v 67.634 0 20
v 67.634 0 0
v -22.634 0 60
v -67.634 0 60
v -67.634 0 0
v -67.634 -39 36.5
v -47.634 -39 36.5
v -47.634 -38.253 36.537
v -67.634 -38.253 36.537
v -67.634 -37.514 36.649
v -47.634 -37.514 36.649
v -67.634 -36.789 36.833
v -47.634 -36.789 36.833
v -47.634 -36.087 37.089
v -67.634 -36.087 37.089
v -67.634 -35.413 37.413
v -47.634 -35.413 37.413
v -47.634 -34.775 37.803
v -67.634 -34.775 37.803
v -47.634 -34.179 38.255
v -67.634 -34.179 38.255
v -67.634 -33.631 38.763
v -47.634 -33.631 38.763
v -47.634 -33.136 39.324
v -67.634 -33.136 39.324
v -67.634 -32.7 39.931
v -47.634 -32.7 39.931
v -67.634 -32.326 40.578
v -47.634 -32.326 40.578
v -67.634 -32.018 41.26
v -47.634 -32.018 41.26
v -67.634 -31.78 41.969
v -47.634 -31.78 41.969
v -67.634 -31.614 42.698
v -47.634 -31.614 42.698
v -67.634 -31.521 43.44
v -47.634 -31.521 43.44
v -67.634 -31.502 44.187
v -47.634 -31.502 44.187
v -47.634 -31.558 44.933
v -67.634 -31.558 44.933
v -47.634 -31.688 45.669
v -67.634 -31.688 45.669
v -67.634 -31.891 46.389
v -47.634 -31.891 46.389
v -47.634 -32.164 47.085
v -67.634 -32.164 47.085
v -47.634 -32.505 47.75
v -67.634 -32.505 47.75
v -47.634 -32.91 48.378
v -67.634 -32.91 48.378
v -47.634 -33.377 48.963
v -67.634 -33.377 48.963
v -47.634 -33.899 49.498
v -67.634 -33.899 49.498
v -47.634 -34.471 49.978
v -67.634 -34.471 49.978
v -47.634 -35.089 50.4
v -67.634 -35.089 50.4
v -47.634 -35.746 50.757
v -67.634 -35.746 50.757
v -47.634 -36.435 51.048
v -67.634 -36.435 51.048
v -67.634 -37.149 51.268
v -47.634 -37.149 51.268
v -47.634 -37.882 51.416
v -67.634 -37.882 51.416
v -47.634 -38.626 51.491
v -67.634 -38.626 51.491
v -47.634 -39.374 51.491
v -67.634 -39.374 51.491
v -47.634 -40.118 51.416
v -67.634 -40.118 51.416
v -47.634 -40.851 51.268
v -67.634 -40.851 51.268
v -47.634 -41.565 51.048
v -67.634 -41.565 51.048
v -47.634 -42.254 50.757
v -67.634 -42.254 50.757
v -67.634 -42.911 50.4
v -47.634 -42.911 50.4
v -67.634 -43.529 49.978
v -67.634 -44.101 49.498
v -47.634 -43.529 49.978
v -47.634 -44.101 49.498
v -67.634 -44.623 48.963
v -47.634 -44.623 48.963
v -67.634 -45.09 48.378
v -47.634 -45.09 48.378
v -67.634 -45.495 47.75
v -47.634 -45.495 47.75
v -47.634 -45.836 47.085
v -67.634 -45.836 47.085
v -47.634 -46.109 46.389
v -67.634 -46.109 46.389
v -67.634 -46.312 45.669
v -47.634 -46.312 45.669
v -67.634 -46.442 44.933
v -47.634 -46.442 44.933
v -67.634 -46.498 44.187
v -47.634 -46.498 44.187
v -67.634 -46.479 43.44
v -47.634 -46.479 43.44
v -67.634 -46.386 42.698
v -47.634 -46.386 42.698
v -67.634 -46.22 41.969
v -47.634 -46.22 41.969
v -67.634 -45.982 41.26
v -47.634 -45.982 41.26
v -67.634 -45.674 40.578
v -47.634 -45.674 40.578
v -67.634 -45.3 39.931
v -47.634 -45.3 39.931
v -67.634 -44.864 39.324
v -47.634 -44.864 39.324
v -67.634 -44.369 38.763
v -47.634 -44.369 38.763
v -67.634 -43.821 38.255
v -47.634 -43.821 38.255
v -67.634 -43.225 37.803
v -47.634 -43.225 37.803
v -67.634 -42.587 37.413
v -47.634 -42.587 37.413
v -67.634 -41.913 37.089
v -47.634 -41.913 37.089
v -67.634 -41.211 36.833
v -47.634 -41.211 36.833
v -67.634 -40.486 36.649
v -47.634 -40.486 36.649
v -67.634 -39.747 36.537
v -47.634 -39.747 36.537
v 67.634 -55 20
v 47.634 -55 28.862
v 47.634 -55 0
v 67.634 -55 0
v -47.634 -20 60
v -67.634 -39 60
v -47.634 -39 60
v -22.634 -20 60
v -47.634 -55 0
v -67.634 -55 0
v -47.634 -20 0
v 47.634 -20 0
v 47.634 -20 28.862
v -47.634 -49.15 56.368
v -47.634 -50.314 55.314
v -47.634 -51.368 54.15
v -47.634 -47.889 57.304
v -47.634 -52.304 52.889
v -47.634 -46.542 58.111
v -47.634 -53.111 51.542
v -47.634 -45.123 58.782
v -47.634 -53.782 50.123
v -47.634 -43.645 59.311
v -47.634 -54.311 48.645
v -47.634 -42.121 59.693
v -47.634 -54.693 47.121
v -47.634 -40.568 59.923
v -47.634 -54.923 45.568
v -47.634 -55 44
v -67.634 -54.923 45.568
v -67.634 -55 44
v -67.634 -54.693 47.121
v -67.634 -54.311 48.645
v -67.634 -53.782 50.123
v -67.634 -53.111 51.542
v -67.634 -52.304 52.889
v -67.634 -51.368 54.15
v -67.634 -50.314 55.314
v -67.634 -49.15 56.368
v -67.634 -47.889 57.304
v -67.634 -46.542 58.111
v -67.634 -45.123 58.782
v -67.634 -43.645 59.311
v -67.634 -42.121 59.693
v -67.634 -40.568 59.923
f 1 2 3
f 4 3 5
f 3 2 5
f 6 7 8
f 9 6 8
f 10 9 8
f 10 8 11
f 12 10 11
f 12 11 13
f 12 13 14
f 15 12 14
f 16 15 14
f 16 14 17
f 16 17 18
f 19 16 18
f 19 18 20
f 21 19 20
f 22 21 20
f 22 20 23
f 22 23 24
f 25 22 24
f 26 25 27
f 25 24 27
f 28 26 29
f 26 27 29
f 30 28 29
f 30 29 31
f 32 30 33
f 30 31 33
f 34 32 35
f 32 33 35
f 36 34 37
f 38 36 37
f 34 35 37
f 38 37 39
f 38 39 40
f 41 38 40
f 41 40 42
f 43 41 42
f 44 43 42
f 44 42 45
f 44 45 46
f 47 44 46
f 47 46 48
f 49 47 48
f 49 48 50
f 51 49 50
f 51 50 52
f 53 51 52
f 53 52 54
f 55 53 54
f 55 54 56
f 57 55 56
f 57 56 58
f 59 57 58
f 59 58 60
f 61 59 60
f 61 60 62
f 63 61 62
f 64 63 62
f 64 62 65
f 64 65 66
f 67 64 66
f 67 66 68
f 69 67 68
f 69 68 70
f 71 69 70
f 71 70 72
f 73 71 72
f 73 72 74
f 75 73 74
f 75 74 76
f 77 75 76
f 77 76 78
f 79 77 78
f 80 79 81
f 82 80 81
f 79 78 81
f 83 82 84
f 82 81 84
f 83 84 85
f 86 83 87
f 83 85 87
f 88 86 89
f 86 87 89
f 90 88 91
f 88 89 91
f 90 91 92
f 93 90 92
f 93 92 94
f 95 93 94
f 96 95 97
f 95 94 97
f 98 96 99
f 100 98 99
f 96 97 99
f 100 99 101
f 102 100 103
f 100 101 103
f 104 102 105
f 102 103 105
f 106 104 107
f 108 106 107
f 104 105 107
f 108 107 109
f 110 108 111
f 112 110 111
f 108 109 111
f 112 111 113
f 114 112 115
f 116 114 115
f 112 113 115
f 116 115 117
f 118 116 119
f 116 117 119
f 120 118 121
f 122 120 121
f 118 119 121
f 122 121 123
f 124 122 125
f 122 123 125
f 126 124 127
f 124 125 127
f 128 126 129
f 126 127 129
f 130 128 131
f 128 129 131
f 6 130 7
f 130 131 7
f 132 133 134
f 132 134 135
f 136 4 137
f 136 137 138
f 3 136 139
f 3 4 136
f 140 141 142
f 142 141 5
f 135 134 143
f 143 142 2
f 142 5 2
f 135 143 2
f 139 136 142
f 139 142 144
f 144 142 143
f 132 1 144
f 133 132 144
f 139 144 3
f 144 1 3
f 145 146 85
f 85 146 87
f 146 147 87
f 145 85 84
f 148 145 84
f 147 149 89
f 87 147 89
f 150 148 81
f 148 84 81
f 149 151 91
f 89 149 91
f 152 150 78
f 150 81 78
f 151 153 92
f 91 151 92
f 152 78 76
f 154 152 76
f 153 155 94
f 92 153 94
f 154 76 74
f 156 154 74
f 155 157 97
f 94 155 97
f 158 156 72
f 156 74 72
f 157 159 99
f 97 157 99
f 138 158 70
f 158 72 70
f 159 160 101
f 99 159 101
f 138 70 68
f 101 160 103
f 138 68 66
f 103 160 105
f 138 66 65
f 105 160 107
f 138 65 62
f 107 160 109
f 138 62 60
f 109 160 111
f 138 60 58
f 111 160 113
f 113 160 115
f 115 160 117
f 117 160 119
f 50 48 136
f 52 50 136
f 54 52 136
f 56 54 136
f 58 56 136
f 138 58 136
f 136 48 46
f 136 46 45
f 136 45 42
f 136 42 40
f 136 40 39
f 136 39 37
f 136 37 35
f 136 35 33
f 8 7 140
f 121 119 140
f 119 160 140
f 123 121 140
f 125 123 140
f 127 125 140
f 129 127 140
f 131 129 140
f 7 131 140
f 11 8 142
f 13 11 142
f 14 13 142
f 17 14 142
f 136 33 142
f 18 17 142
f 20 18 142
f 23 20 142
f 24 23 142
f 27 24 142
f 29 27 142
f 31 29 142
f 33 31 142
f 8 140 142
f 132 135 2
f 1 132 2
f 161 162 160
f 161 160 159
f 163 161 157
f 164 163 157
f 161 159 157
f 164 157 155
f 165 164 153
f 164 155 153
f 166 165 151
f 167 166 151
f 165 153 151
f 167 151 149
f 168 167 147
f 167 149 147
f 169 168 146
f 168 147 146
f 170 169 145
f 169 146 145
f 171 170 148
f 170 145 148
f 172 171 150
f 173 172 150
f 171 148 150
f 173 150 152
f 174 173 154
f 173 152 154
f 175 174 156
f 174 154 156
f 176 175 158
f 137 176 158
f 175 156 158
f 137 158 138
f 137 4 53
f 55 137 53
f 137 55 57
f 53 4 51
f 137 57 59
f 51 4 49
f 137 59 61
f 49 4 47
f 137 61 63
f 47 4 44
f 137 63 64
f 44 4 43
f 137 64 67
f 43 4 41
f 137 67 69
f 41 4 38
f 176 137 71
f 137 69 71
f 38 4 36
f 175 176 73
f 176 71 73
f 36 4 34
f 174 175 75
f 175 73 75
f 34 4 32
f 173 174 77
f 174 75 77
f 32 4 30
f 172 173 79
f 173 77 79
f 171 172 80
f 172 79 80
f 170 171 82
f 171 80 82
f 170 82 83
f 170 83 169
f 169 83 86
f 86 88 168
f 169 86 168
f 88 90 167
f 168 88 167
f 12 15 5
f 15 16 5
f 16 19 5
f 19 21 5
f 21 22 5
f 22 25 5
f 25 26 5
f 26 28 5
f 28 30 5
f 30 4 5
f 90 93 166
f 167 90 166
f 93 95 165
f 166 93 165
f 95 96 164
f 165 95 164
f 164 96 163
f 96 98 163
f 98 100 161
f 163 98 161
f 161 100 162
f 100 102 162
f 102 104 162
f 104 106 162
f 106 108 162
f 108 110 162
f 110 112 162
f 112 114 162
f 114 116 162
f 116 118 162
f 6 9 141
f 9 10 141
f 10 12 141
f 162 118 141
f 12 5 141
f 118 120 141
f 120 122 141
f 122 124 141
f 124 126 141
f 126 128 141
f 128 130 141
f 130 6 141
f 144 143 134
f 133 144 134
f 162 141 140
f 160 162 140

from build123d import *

# Parameters (mm, degrees)
BOSS_EXTRUDE3_DEPTH     = 60
CUT_EXTRUDE1_DEPTH      = 97.950548376
CUT_EXTRUDE1_DEPTH_BACK = 97.950548376
FILLET3_R               = 16
SKETCH7_R               = 7.5
CUT_EXTRUDE2_DEPTH      = 100


with BuildPart() as part:
    # Sketch3 → Boss-Extrude3 (new body)
    with BuildSketch(Plane.XY):
        Polygon((-47.6343761, -55), (-47.6343761, -20), (47.6343761, -20), (47.6343761, -55), (67.6343761, -55), (67.6343761, 0), (-67.6343761, 0), (-67.6343761, -55), align=None)
    extrude(amount=BOSS_EXTRUDE3_DEPTH)

    # Sketch4 → Cut-Extrude1 (cut, two sides: drawn at the far end of the back side and taken through both)
    with BuildSketch(Plane.XZ.offset(20).offset(-CUT_EXTRUDE1_DEPTH_BACK)):
        Polygon((-22.6343761, 60), (67.6343761, 60), (67.6343761, 20), align=None)
    extrude(amount=CUT_EXTRUDE1_DEPTH + CUT_EXTRUDE1_DEPTH_BACK, mode=Mode.SUBTRACT)

    # Fillet3
    fillet3_edges = [part.edges().sort_by_distance(p)[0] for p in [
        (-57.6343761, -55, 60),
    ]]
    fillet(fillet3_edges, radius=FILLET3_R)

    # Sketch7 → Cut-Extrude2 (cut)
    with BuildSketch(Plane(origin=(-47.6343761, 0, 0), x_dir=(0, 0, -1), z_dir=(1, 0, 0))):
        with Locations((-44, -39)):
            Circle(SKETCH7_R)
    extrude(amount=-CUT_EXTRUDE2_DEPTH, mode=Mode.SUBTRACT)


solid = part.part
